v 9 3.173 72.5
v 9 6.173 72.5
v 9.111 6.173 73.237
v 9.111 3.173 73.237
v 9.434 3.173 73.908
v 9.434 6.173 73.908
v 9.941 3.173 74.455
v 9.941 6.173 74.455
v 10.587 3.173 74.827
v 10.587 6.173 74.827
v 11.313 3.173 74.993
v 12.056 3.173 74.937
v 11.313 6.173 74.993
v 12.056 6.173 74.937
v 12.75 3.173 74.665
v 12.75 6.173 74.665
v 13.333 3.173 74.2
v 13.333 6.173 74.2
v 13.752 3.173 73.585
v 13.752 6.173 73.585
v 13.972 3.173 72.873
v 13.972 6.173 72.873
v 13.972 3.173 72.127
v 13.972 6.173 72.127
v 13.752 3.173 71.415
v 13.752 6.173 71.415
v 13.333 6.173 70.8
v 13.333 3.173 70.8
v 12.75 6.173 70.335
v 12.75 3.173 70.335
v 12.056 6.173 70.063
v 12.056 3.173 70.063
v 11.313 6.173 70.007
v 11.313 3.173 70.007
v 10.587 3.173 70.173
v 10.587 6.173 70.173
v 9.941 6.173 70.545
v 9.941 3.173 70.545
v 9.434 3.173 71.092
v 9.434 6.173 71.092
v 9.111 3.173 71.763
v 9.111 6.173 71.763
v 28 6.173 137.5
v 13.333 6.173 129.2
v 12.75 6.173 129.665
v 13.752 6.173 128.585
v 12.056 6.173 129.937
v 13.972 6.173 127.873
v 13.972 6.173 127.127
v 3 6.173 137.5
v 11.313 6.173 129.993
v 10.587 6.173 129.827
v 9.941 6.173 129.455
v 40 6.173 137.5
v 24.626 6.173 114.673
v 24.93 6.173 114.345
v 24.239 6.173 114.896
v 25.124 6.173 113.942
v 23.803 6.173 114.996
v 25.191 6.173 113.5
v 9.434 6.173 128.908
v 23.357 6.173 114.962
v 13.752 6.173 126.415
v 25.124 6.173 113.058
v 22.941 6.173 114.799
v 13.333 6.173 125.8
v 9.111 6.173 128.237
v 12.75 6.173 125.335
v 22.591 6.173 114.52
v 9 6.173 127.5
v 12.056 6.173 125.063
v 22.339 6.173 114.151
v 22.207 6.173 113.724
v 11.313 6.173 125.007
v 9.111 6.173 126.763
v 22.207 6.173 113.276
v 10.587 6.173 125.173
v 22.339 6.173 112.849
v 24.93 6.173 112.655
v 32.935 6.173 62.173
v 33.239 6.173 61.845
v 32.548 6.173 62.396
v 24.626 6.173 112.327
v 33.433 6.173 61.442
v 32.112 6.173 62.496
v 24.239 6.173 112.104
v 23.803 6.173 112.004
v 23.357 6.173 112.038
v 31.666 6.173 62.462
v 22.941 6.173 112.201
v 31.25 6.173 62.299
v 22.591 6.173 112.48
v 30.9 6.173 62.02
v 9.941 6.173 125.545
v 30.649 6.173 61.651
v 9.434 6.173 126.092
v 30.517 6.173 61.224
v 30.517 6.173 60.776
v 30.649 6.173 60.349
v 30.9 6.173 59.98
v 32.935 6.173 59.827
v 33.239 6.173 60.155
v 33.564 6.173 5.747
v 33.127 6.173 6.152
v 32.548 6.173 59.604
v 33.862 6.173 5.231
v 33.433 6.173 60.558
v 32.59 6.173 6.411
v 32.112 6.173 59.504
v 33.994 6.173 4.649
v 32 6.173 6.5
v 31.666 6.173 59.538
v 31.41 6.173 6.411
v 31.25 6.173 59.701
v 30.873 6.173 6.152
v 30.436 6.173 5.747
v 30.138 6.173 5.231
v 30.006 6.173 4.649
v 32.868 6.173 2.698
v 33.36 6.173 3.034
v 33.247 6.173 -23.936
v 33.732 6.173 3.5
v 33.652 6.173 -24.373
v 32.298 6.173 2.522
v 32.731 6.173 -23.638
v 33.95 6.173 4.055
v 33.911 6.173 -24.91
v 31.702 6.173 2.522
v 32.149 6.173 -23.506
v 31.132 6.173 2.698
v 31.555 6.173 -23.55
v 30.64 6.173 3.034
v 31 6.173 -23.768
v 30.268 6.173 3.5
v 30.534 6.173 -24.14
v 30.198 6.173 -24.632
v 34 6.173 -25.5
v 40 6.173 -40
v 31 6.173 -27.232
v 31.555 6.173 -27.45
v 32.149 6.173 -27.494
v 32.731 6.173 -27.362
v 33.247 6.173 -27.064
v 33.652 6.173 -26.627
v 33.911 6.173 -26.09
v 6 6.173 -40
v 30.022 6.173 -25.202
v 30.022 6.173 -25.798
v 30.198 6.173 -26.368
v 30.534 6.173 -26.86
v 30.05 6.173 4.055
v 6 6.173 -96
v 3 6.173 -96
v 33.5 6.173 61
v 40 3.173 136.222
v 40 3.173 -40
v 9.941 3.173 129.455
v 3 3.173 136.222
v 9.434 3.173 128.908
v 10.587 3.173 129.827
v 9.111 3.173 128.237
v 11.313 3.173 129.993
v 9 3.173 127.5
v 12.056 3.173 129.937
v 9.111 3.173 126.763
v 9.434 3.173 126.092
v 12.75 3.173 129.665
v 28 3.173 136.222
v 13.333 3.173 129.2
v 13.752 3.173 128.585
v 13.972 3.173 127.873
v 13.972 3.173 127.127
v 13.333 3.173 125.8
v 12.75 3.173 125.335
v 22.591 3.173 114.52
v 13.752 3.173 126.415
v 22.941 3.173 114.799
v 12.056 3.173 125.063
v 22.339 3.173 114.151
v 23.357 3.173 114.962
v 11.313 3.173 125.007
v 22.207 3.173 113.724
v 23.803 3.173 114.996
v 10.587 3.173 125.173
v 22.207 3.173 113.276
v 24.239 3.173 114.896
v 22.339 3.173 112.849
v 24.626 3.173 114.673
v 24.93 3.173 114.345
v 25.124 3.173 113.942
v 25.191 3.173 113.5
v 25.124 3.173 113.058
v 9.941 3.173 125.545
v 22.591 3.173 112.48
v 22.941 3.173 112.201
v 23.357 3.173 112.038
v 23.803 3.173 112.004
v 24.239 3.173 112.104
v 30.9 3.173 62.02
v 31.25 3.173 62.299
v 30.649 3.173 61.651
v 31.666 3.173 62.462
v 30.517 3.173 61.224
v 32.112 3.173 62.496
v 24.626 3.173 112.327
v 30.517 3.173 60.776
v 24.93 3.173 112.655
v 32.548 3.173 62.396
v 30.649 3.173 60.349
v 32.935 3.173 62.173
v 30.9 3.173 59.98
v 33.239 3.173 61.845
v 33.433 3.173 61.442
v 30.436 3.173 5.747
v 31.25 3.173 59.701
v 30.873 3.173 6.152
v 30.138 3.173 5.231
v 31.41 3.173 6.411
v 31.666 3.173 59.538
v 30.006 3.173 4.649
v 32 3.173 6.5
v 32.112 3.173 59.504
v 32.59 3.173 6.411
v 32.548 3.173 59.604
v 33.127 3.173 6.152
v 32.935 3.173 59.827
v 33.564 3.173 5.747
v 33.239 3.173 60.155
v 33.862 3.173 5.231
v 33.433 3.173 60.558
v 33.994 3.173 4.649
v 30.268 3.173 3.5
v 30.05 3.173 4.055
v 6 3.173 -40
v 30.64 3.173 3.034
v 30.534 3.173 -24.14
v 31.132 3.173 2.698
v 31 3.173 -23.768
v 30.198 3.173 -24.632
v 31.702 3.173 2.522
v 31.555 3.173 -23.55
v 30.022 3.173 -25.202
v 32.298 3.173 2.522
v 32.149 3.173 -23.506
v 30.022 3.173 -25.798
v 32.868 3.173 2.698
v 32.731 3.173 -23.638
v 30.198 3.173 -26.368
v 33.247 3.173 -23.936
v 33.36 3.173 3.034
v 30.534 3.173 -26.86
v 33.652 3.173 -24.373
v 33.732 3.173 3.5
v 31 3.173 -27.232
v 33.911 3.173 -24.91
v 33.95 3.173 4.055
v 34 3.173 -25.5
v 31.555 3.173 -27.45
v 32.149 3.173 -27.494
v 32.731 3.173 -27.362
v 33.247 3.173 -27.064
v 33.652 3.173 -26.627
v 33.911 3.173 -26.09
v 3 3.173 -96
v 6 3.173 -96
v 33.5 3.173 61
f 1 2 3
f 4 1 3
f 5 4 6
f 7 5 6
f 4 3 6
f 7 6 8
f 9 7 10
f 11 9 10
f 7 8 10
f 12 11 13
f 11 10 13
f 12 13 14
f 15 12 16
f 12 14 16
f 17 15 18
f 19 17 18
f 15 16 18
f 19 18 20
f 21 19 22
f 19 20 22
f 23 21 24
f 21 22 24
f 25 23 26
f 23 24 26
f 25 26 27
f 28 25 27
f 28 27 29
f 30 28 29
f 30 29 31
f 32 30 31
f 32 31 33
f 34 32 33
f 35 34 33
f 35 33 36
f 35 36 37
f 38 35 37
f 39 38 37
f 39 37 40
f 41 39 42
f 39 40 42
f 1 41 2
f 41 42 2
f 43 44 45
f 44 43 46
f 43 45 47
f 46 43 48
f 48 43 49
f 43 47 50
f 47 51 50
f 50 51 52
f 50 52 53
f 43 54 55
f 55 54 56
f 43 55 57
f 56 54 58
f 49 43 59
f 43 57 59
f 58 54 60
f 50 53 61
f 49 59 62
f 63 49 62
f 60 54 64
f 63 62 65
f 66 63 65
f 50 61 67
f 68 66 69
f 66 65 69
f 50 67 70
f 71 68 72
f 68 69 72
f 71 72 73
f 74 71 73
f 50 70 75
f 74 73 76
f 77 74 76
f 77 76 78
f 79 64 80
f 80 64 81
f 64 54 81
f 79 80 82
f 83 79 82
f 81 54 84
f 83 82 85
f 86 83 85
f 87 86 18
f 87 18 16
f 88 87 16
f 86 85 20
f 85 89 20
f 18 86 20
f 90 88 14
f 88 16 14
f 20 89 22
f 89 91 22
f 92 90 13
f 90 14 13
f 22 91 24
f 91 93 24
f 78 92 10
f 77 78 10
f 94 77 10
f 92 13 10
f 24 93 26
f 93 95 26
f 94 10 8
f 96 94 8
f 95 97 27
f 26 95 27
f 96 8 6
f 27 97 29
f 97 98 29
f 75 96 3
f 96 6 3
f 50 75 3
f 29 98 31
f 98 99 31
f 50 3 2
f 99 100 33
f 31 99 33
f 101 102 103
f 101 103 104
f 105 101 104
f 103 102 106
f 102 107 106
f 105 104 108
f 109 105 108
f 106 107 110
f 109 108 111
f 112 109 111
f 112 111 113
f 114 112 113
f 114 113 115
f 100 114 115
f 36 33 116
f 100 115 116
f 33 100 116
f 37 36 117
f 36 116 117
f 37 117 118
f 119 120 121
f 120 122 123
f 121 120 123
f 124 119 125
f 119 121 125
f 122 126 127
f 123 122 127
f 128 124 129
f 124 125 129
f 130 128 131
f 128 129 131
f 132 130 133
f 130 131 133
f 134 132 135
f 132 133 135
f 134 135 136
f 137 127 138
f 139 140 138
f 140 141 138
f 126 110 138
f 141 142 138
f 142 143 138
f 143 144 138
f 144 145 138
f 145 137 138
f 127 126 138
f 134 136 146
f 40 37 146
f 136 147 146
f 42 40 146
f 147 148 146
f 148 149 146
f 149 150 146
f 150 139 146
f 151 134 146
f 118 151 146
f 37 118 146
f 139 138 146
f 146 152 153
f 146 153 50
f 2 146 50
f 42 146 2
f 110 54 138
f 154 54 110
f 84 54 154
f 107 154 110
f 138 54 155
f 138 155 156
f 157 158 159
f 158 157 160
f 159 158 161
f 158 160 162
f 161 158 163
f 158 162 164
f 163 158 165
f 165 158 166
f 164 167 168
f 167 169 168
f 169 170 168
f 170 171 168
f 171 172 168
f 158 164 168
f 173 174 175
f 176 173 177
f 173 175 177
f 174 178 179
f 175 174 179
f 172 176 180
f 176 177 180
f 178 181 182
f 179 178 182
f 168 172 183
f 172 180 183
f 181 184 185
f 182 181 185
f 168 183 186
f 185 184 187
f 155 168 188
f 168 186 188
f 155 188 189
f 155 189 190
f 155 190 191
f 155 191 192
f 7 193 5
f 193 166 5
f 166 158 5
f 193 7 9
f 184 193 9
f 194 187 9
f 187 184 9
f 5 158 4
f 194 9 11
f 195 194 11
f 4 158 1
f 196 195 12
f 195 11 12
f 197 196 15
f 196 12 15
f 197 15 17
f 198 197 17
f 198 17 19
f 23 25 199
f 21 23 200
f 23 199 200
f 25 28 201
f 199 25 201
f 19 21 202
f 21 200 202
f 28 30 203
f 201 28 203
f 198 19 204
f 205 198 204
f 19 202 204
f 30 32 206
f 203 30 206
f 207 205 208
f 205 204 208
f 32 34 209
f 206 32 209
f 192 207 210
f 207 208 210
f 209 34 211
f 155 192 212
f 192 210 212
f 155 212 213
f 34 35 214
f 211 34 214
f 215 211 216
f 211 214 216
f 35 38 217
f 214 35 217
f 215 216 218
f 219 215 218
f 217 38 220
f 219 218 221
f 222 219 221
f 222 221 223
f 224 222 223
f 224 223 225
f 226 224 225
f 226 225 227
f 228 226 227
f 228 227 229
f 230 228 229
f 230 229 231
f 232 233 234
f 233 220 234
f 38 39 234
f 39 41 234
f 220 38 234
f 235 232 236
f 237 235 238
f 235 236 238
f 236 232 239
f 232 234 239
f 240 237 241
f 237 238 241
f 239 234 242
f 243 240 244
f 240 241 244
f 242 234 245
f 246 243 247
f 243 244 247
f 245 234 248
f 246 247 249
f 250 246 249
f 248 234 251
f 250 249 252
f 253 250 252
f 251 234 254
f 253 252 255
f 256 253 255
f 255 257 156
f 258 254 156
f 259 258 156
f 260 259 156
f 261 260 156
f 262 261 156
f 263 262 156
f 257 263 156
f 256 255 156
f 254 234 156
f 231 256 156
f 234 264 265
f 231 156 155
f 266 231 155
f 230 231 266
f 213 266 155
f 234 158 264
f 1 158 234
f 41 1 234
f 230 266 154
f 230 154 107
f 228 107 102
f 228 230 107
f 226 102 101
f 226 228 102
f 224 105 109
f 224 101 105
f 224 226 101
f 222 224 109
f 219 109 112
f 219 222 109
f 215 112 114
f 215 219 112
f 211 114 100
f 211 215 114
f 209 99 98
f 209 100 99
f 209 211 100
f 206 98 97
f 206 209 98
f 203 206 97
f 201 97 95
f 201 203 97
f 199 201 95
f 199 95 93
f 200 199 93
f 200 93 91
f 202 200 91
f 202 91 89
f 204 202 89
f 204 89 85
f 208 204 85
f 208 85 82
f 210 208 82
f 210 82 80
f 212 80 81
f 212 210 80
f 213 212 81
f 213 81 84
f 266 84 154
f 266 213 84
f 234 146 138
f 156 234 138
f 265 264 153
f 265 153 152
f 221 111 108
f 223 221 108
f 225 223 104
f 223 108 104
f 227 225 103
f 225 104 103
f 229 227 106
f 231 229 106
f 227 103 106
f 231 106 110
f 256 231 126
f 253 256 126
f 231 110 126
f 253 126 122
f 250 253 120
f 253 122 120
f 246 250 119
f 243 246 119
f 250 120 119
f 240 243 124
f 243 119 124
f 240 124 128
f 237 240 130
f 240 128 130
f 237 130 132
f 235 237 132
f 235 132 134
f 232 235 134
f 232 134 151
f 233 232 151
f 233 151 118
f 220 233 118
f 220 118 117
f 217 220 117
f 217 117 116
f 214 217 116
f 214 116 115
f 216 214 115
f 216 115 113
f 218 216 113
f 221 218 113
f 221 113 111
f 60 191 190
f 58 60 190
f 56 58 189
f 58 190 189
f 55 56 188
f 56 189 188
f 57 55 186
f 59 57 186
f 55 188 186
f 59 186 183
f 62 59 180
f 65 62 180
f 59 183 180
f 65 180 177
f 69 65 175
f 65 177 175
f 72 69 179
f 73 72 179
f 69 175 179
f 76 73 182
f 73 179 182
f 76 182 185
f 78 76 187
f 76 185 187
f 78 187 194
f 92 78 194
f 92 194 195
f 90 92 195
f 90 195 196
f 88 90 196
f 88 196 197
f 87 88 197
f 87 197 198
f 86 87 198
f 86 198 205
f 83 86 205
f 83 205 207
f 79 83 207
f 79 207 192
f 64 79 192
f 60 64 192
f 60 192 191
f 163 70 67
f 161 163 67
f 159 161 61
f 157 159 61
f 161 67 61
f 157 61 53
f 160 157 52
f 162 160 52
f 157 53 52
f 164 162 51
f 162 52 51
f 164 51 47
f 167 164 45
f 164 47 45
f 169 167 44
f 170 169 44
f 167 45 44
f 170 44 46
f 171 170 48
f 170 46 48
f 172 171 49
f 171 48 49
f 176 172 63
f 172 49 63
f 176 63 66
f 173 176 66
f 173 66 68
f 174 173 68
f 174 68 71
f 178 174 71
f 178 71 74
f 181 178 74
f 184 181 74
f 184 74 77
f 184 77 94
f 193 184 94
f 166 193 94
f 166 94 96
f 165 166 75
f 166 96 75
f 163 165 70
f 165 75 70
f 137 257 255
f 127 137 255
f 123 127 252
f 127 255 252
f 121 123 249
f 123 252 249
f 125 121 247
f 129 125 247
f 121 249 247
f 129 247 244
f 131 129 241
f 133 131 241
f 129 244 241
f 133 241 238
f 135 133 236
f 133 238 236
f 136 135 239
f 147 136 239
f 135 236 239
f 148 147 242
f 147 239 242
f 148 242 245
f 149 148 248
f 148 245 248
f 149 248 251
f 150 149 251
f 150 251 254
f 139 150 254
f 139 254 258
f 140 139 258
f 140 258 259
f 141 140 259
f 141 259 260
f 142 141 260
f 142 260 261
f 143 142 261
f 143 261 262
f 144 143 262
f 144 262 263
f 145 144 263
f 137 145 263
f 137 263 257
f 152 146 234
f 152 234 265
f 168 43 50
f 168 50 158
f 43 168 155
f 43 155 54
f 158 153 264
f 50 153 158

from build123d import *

# Parameters (mm, degrees)
EXTRUDE_1_DEPTH           = 150
EXTRUDE_1_DEPTH_BACK      = 150
SKETCH_4_R                = 2.5
CUT_EXTRUDE_4_DEPTH       = 3
SKETCH_5_W                = 52
SKETCH_5_H                = 100
CUT_EXTRUDE_5_DEPTH       = 3
SKETCH_7_R                = 1.6
SKETCH_7_R_2              = 6.5
CUT_EXTRUDE_9_DEPTH       = 185.063533313
SKETCH_6_W                = 40
SKETCH_6_H                = 200
CUT_EXTRUDE_10_DEPTH      = 10
CUT_EXTRUDE_12_DEPTH      = 4
SKETCH_12_W               = 34
SKETCH_12_H               = 110
CUT_EXTRUDE_13_DEPTH      = 4
SKETCH_14_W               = 4.2
SKETCH_14_H               = 14
CUT_EXTRUDE_14_DEPTH      = 10
SKETCH_15_R               = 2
CUT_EXTRUDE_15_DEPTH      = 26
SKETCH_17_R               = 1.5
CUT_EXTRUDE_19_DEPTH      = 10
CUT_EXTRUDE_20_DEPTH      = 10
CUT_EXTRUDE_21_DEPTH      = 31
SKETCH_22_R               = 1.5
CUT_EXTRUDE_22_DEPTH      = 31
SKETCH_23_W               = 12
SKETCH_23_H               = 87.5
EXTRUDE_3_DEPTH           = 3
CUT_EXTRUDE_23_DEPTH      = 18
CUT_EXTRUDE_24_DEPTH      = 13
CUT_EXTRUDE_24_DEPTH_BACK = 4
SKETCH_25_R               = 1.5
SKETCH_26_R               = 2
CUT_EXTRUDE_25_DEPTH      = 10
CUT_EXTRUDE_29_DEPTH      = 10
CUT_EXTRUDE_30_DEPTH      = 3
SKETCH_34_W               = 3
SKETCH_34_H               = 40
CUT_EXTRUDE_31_DEPTH      = 10


with BuildPart() as part:
    # 草图1 → 凸台-拉伸1 (new, two sides: drawn at the far end of the back side and taken through both)
    with BuildSketch(Plane.XY.offset(-EXTRUDE_1_DEPTH_BACK)):
        Polygon((0, 4.173281966), (0, -73.826718034), (3, -73.826718034), (3, 1.173281966), (3, 3.173281966), (5, 3.173281966), (80, 3.173281966), (80, 6.173281966), (2, 6.173281966), (0, 6.173281966), align=None)
    extrude(amount=EXTRUDE_1_DEPTH + EXTRUDE_1_DEPTH_BACK)

    # 草图4 → 切除-拉伸4 (cut)
    with BuildSketch(Plane(origin=(0, 6.173281966, 0), x_dir=(1, 0, 0), z_dir=(0, 1, 0))):
        with Locations(Location((11.5, -72.5, 0), (0, 0, 180))):
            Circle(SKETCH_4_R)
        with Locations(Location((11.5, -127.5, 0), (0, 0, 180))):
            Circle(SKETCH_4_R)
    extrude(amount=-CUT_EXTRUDE_4_DEPTH, mode=Mode.SUBTRACT)

    # 草图5 → 切除-拉伸5 (cut)
    with BuildSketch(Plane(origin=(0, 6.173281966, 0), x_dir=(1, 0, 0), z_dir=(0, 1, 0))):
        with Locations((54, -100)):
            Rectangle(SKETCH_5_W, SKETCH_5_H)
    extrude(amount=-CUT_EXTRUDE_5_DEPTH, mode=Mode.SUBTRACT)

    # 草图7 → 切除-拉伸9 (cut, through all)
    with BuildSketch(Plane(origin=(3, 0, 0), x_dir=(0, 0, -1), z_dir=(1, 0, 0))):
        with Locations(Location((-54.5, -43.826718034, 0), (0, 0, 90))):
            Circle(SKETCH_7_R)
        with Locations(Location((-62.25, -30.403324275, 0), (0, 0, 90))):
            Circle(SKETCH_7_R)
        with Locations(Location((-62.25, -57.250111793, 0), (0, 0, 90))):
            Circle(SKETCH_7_R)
        with Locations(Location((-77.75, -30.403324275, 0), (0, 0, 90))):
            Circle(SKETCH_7_R)
        with Locations(Location((-77.75, -57.250111793, 0), (0, 0, 90))):
            Circle(SKETCH_7_R)
        with Locations(Location((-85.5, -43.826718034, 0), (0, 0, 90))):
            Circle(SKETCH_7_R)
        with Locations(Location((115.5, -43.826718034, 0), (0, 0, 90))):
            Circle(SKETCH_7_R)
        with Locations(Location((107.75, -30.403324275, 0), (0, 0, 90))):
            Circle(SKETCH_7_R)
        with Locations(Location((107.75, -57.250111793, 0), (0, 0, 90))):
            Circle(SKETCH_7_R)
        with Locations(Location((92.25, -30.403324275, 0), (0, 0, 90))):
            Circle(SKETCH_7_R)
        with Locations(Location((92.25, -57.250111793, 0), (0, 0, 90))):
            Circle(SKETCH_7_R)
        with Locations(Location((84.5, -43.826718034, 0), (0, 0, 90))):
            Circle(SKETCH_7_R)
        with Locations(Location((-70, -50.826718034, 0), (0, 0, 90))):
            Circle(SKETCH_7_R_2)
        with Locations(Location((100, -50.826718034, 0), (0, 0, 90))):
            Circle(SKETCH_7_R_2)
    extrude(amount=-CUT_EXTRUDE_9_DEPTH, mode=Mode.SUBTRACT)

    # 草图6 → 切除-拉伸10 (cut)
    with BuildSketch(Plane(origin=(0, 6.173281966, 0), x_dir=(1, 0, 0), z_dir=(0, 1, 0))):
        with Locations((60, 50)):
            Rectangle(SKETCH_6_W, SKETCH_6_H)
    extrude(amount=-CUT_EXTRUDE_10_DEPTH, mode=Mode.SUBTRACT)

    # 草图11 → 切除-拉伸12 (cut)
    with BuildSketch(Plane.ZY):
        Polygon((-128.345117246, -73.826718034), (-150, -73.826718034), (-150, 3.173281966), align=None)
    extrude(amount=-CUT_EXTRUDE_12_DEPTH, mode=Mode.SUBTRACT)

    # 草图12 → 切除-拉伸13 (cut)
    with BuildSketch(Plane(origin=(0, 6.173281966, 0), x_dir=(1, 0, 0), z_dir=(0, 1, 0))):
        with Locations((23, 95)):
            Rectangle(SKETCH_12_W, SKETCH_12_H)
    extrude(amount=-CUT_EXTRUDE_13_DEPTH, mode=Mode.SUBTRACT)

    # 草图14 → 切除-拉伸14 (cut)
    with BuildSketch(Plane.XZ.offset(-3.173281966)):
        with Locations((5.1, -103)):
            Rectangle(SKETCH_14_W, SKETCH_14_H)
    extrude(amount=-CUT_EXTRUDE_14_DEPTH, mode=Mode.SUBTRACT)

    # 草图15 → 切除-拉伸15 (cut)
    with BuildSketch(Plane(origin=(0, 6.173281966, 0), x_dir=(1, 0, 0), z_dir=(0, 1, 0))):
        with Locations(Location((32, -4.5, 0), (0, 0, 270))):
            Circle(SKETCH_15_R)
    extrude(amount=-CUT_EXTRUDE_15_DEPTH, mode=Mode.SUBTRACT)

    # 草图17 → 切除-拉伸19 (cut)
    with BuildSketch(Plane.XZ.offset(-3.173281966)):
        with Locations((23.690733746, 113.5)):
            Circle(SKETCH_17_R)
    extrude(amount=-CUT_EXTRUDE_19_DEPTH, mode=Mode.SUBTRACT)

    # 草图18 → 切除-拉伸20 (cut)
    with BuildSketch(Plane.ZY):
        Polygon((150, -73.826718034), (118.550084008, -73.826718034), (150, 0), align=None)
    extrude(amount=-CUT_EXTRUDE_20_DEPTH, mode=Mode.SUBTRACT)

    # 草图21 → 切除-拉伸21 (cut)
    with BuildSketch(Plane.ZY):
        Polygon((118.550084008, -73.826718034), (150, 0), (150, 6.173281966), (137.5, 6.173281966), (132.072189672, -6.568164552), (98.550084008, -73.826718034), align=None)
    extrude(amount=-CUT_EXTRUDE_21_DEPTH, mode=Mode.SUBTRACT)

    # 草图22 → 切除-拉伸22 (cut)
    with BuildSketch(Plane.ZY):
        with Locations(Location((-106, 3.173281966, 0), (0, 0, 270))):
            Circle(SKETCH_22_R)
        with Locations(Location((-100, 3.173281966, 0), (0, 0, 270))):
            Circle(SKETCH_22_R)
        with Locations(Location((-106, -1.826718034, 0), (0, 0, 270))):
            Circle(SKETCH_22_R)
        with Locations(Location((-100, -1.826718034, 0), (0, 0, 270))):
            Circle(SKETCH_22_R)
    extrude(amount=-CUT_EXTRUDE_22_DEPTH, mode=Mode.SUBTRACT)

    # 草图23 → 凸台-拉伸3 (add)
    with BuildSketch(Plane(origin=(0, 6.173281966, 0), x_dir=(1, 0, 0), z_dir=(0, 1, 0))):
        with Locations((34, -93.75)):
            Rectangle(SKETCH_23_W, SKETCH_23_H)
    extrude(amount=-EXTRUDE_3_DEPTH)

    # 草图24 → 切除-拉伸23 (cut)
    with BuildSketch(Plane.ZY.offset(-28)):
        Polygon((137.5, 6.173281966), (137.5, 3.173281966), (136.222010805, 3.173281966), align=None)
    extrude(amount=-CUT_EXTRUDE_23_DEPTH, mode=Mode.SUBTRACT)

    # 草图25 → 切除-拉伸24 (cut, two sides: drawn at the far end of the back side and taken through both)
    with BuildSketch(Plane(origin=(0, 6.173281966, 0), x_dir=(1, 0, 0), z_dir=(0, 1, 0)).offset(-CUT_EXTRUDE_24_DEPTH_BACK)):
        with Locations((32, -61)):
            Circle(SKETCH_25_R)
    extrude(amount=CUT_EXTRUDE_24_DEPTH + CUT_EXTRUDE_24_DEPTH_BACK, mode=Mode.SUBTRACT)

    # 草图26 → 切除-拉伸25 (cut)
    with BuildSketch(Plane.XZ.offset(-3.173281966)):
        with Locations((32, -25.5)):
            Circle(SKETCH_26_R)
    extrude(amount=-CUT_EXTRUDE_25_DEPTH, mode=Mode.SUBTRACT)

    # 草图31 → 切除-拉伸29 (cut)
    with BuildSketch(Plane(origin=(3, 0, 0), x_dir=(0, 0, -1), z_dir=(1, 0, 0))):
        Polygon((-38.550084008, -73.826718034), (-10.102483381, -23.826718034), (39.897516619, -23.826718034), (68.345117246, -73.826718034), align=None)
    extrude(amount=-CUT_EXTRUDE_29_DEPTH, mode=Mode.SUBTRACT)

    # 草图33 → 切除-拉伸30 (cut)
    with BuildSketch(Plane.ZY):
        Polygon((-150, 6.173281966), (-150, -87.897987577), (142.92942198, -91.593646071), (144.162869872, 6.173281966), align=None)
    extrude(amount=-CUT_EXTRUDE_30_DEPTH, mode=Mode.SUBTRACT)


with BuildPart() as cut_extrude_30_piece_1:
    # of the separate pieces the step leaves, piece 1, a body of its own (cut_extrude_30_pieces)
    add(part.part.solids().sort_by_distance((3, 3.173281966, 136.222010805))[0])


with BuildPart() as cut_extrude_30_piece_2:
    # of the separate pieces the step leaves, piece 2, a body of its own (cut_extrude_30_pieces)
    add(part.part.solids().sort_by_distance((6, 6.173281966, -110))[0])

    # 草图34 → 切除-拉伸31 (cut)
    with BuildSketch(Plane(origin=(0, 6.173281966, 0), x_dir=(1, 0, 0), z_dir=(0, 1, 0))):
        with Locations((4.5, 130)):
            Rectangle(SKETCH_34_W, SKETCH_34_H)
    extrude(amount=-CUT_EXTRUDE_31_DEPTH, mode=Mode.SUBTRACT)


solid = cut_extrude_30_piece_1.part
